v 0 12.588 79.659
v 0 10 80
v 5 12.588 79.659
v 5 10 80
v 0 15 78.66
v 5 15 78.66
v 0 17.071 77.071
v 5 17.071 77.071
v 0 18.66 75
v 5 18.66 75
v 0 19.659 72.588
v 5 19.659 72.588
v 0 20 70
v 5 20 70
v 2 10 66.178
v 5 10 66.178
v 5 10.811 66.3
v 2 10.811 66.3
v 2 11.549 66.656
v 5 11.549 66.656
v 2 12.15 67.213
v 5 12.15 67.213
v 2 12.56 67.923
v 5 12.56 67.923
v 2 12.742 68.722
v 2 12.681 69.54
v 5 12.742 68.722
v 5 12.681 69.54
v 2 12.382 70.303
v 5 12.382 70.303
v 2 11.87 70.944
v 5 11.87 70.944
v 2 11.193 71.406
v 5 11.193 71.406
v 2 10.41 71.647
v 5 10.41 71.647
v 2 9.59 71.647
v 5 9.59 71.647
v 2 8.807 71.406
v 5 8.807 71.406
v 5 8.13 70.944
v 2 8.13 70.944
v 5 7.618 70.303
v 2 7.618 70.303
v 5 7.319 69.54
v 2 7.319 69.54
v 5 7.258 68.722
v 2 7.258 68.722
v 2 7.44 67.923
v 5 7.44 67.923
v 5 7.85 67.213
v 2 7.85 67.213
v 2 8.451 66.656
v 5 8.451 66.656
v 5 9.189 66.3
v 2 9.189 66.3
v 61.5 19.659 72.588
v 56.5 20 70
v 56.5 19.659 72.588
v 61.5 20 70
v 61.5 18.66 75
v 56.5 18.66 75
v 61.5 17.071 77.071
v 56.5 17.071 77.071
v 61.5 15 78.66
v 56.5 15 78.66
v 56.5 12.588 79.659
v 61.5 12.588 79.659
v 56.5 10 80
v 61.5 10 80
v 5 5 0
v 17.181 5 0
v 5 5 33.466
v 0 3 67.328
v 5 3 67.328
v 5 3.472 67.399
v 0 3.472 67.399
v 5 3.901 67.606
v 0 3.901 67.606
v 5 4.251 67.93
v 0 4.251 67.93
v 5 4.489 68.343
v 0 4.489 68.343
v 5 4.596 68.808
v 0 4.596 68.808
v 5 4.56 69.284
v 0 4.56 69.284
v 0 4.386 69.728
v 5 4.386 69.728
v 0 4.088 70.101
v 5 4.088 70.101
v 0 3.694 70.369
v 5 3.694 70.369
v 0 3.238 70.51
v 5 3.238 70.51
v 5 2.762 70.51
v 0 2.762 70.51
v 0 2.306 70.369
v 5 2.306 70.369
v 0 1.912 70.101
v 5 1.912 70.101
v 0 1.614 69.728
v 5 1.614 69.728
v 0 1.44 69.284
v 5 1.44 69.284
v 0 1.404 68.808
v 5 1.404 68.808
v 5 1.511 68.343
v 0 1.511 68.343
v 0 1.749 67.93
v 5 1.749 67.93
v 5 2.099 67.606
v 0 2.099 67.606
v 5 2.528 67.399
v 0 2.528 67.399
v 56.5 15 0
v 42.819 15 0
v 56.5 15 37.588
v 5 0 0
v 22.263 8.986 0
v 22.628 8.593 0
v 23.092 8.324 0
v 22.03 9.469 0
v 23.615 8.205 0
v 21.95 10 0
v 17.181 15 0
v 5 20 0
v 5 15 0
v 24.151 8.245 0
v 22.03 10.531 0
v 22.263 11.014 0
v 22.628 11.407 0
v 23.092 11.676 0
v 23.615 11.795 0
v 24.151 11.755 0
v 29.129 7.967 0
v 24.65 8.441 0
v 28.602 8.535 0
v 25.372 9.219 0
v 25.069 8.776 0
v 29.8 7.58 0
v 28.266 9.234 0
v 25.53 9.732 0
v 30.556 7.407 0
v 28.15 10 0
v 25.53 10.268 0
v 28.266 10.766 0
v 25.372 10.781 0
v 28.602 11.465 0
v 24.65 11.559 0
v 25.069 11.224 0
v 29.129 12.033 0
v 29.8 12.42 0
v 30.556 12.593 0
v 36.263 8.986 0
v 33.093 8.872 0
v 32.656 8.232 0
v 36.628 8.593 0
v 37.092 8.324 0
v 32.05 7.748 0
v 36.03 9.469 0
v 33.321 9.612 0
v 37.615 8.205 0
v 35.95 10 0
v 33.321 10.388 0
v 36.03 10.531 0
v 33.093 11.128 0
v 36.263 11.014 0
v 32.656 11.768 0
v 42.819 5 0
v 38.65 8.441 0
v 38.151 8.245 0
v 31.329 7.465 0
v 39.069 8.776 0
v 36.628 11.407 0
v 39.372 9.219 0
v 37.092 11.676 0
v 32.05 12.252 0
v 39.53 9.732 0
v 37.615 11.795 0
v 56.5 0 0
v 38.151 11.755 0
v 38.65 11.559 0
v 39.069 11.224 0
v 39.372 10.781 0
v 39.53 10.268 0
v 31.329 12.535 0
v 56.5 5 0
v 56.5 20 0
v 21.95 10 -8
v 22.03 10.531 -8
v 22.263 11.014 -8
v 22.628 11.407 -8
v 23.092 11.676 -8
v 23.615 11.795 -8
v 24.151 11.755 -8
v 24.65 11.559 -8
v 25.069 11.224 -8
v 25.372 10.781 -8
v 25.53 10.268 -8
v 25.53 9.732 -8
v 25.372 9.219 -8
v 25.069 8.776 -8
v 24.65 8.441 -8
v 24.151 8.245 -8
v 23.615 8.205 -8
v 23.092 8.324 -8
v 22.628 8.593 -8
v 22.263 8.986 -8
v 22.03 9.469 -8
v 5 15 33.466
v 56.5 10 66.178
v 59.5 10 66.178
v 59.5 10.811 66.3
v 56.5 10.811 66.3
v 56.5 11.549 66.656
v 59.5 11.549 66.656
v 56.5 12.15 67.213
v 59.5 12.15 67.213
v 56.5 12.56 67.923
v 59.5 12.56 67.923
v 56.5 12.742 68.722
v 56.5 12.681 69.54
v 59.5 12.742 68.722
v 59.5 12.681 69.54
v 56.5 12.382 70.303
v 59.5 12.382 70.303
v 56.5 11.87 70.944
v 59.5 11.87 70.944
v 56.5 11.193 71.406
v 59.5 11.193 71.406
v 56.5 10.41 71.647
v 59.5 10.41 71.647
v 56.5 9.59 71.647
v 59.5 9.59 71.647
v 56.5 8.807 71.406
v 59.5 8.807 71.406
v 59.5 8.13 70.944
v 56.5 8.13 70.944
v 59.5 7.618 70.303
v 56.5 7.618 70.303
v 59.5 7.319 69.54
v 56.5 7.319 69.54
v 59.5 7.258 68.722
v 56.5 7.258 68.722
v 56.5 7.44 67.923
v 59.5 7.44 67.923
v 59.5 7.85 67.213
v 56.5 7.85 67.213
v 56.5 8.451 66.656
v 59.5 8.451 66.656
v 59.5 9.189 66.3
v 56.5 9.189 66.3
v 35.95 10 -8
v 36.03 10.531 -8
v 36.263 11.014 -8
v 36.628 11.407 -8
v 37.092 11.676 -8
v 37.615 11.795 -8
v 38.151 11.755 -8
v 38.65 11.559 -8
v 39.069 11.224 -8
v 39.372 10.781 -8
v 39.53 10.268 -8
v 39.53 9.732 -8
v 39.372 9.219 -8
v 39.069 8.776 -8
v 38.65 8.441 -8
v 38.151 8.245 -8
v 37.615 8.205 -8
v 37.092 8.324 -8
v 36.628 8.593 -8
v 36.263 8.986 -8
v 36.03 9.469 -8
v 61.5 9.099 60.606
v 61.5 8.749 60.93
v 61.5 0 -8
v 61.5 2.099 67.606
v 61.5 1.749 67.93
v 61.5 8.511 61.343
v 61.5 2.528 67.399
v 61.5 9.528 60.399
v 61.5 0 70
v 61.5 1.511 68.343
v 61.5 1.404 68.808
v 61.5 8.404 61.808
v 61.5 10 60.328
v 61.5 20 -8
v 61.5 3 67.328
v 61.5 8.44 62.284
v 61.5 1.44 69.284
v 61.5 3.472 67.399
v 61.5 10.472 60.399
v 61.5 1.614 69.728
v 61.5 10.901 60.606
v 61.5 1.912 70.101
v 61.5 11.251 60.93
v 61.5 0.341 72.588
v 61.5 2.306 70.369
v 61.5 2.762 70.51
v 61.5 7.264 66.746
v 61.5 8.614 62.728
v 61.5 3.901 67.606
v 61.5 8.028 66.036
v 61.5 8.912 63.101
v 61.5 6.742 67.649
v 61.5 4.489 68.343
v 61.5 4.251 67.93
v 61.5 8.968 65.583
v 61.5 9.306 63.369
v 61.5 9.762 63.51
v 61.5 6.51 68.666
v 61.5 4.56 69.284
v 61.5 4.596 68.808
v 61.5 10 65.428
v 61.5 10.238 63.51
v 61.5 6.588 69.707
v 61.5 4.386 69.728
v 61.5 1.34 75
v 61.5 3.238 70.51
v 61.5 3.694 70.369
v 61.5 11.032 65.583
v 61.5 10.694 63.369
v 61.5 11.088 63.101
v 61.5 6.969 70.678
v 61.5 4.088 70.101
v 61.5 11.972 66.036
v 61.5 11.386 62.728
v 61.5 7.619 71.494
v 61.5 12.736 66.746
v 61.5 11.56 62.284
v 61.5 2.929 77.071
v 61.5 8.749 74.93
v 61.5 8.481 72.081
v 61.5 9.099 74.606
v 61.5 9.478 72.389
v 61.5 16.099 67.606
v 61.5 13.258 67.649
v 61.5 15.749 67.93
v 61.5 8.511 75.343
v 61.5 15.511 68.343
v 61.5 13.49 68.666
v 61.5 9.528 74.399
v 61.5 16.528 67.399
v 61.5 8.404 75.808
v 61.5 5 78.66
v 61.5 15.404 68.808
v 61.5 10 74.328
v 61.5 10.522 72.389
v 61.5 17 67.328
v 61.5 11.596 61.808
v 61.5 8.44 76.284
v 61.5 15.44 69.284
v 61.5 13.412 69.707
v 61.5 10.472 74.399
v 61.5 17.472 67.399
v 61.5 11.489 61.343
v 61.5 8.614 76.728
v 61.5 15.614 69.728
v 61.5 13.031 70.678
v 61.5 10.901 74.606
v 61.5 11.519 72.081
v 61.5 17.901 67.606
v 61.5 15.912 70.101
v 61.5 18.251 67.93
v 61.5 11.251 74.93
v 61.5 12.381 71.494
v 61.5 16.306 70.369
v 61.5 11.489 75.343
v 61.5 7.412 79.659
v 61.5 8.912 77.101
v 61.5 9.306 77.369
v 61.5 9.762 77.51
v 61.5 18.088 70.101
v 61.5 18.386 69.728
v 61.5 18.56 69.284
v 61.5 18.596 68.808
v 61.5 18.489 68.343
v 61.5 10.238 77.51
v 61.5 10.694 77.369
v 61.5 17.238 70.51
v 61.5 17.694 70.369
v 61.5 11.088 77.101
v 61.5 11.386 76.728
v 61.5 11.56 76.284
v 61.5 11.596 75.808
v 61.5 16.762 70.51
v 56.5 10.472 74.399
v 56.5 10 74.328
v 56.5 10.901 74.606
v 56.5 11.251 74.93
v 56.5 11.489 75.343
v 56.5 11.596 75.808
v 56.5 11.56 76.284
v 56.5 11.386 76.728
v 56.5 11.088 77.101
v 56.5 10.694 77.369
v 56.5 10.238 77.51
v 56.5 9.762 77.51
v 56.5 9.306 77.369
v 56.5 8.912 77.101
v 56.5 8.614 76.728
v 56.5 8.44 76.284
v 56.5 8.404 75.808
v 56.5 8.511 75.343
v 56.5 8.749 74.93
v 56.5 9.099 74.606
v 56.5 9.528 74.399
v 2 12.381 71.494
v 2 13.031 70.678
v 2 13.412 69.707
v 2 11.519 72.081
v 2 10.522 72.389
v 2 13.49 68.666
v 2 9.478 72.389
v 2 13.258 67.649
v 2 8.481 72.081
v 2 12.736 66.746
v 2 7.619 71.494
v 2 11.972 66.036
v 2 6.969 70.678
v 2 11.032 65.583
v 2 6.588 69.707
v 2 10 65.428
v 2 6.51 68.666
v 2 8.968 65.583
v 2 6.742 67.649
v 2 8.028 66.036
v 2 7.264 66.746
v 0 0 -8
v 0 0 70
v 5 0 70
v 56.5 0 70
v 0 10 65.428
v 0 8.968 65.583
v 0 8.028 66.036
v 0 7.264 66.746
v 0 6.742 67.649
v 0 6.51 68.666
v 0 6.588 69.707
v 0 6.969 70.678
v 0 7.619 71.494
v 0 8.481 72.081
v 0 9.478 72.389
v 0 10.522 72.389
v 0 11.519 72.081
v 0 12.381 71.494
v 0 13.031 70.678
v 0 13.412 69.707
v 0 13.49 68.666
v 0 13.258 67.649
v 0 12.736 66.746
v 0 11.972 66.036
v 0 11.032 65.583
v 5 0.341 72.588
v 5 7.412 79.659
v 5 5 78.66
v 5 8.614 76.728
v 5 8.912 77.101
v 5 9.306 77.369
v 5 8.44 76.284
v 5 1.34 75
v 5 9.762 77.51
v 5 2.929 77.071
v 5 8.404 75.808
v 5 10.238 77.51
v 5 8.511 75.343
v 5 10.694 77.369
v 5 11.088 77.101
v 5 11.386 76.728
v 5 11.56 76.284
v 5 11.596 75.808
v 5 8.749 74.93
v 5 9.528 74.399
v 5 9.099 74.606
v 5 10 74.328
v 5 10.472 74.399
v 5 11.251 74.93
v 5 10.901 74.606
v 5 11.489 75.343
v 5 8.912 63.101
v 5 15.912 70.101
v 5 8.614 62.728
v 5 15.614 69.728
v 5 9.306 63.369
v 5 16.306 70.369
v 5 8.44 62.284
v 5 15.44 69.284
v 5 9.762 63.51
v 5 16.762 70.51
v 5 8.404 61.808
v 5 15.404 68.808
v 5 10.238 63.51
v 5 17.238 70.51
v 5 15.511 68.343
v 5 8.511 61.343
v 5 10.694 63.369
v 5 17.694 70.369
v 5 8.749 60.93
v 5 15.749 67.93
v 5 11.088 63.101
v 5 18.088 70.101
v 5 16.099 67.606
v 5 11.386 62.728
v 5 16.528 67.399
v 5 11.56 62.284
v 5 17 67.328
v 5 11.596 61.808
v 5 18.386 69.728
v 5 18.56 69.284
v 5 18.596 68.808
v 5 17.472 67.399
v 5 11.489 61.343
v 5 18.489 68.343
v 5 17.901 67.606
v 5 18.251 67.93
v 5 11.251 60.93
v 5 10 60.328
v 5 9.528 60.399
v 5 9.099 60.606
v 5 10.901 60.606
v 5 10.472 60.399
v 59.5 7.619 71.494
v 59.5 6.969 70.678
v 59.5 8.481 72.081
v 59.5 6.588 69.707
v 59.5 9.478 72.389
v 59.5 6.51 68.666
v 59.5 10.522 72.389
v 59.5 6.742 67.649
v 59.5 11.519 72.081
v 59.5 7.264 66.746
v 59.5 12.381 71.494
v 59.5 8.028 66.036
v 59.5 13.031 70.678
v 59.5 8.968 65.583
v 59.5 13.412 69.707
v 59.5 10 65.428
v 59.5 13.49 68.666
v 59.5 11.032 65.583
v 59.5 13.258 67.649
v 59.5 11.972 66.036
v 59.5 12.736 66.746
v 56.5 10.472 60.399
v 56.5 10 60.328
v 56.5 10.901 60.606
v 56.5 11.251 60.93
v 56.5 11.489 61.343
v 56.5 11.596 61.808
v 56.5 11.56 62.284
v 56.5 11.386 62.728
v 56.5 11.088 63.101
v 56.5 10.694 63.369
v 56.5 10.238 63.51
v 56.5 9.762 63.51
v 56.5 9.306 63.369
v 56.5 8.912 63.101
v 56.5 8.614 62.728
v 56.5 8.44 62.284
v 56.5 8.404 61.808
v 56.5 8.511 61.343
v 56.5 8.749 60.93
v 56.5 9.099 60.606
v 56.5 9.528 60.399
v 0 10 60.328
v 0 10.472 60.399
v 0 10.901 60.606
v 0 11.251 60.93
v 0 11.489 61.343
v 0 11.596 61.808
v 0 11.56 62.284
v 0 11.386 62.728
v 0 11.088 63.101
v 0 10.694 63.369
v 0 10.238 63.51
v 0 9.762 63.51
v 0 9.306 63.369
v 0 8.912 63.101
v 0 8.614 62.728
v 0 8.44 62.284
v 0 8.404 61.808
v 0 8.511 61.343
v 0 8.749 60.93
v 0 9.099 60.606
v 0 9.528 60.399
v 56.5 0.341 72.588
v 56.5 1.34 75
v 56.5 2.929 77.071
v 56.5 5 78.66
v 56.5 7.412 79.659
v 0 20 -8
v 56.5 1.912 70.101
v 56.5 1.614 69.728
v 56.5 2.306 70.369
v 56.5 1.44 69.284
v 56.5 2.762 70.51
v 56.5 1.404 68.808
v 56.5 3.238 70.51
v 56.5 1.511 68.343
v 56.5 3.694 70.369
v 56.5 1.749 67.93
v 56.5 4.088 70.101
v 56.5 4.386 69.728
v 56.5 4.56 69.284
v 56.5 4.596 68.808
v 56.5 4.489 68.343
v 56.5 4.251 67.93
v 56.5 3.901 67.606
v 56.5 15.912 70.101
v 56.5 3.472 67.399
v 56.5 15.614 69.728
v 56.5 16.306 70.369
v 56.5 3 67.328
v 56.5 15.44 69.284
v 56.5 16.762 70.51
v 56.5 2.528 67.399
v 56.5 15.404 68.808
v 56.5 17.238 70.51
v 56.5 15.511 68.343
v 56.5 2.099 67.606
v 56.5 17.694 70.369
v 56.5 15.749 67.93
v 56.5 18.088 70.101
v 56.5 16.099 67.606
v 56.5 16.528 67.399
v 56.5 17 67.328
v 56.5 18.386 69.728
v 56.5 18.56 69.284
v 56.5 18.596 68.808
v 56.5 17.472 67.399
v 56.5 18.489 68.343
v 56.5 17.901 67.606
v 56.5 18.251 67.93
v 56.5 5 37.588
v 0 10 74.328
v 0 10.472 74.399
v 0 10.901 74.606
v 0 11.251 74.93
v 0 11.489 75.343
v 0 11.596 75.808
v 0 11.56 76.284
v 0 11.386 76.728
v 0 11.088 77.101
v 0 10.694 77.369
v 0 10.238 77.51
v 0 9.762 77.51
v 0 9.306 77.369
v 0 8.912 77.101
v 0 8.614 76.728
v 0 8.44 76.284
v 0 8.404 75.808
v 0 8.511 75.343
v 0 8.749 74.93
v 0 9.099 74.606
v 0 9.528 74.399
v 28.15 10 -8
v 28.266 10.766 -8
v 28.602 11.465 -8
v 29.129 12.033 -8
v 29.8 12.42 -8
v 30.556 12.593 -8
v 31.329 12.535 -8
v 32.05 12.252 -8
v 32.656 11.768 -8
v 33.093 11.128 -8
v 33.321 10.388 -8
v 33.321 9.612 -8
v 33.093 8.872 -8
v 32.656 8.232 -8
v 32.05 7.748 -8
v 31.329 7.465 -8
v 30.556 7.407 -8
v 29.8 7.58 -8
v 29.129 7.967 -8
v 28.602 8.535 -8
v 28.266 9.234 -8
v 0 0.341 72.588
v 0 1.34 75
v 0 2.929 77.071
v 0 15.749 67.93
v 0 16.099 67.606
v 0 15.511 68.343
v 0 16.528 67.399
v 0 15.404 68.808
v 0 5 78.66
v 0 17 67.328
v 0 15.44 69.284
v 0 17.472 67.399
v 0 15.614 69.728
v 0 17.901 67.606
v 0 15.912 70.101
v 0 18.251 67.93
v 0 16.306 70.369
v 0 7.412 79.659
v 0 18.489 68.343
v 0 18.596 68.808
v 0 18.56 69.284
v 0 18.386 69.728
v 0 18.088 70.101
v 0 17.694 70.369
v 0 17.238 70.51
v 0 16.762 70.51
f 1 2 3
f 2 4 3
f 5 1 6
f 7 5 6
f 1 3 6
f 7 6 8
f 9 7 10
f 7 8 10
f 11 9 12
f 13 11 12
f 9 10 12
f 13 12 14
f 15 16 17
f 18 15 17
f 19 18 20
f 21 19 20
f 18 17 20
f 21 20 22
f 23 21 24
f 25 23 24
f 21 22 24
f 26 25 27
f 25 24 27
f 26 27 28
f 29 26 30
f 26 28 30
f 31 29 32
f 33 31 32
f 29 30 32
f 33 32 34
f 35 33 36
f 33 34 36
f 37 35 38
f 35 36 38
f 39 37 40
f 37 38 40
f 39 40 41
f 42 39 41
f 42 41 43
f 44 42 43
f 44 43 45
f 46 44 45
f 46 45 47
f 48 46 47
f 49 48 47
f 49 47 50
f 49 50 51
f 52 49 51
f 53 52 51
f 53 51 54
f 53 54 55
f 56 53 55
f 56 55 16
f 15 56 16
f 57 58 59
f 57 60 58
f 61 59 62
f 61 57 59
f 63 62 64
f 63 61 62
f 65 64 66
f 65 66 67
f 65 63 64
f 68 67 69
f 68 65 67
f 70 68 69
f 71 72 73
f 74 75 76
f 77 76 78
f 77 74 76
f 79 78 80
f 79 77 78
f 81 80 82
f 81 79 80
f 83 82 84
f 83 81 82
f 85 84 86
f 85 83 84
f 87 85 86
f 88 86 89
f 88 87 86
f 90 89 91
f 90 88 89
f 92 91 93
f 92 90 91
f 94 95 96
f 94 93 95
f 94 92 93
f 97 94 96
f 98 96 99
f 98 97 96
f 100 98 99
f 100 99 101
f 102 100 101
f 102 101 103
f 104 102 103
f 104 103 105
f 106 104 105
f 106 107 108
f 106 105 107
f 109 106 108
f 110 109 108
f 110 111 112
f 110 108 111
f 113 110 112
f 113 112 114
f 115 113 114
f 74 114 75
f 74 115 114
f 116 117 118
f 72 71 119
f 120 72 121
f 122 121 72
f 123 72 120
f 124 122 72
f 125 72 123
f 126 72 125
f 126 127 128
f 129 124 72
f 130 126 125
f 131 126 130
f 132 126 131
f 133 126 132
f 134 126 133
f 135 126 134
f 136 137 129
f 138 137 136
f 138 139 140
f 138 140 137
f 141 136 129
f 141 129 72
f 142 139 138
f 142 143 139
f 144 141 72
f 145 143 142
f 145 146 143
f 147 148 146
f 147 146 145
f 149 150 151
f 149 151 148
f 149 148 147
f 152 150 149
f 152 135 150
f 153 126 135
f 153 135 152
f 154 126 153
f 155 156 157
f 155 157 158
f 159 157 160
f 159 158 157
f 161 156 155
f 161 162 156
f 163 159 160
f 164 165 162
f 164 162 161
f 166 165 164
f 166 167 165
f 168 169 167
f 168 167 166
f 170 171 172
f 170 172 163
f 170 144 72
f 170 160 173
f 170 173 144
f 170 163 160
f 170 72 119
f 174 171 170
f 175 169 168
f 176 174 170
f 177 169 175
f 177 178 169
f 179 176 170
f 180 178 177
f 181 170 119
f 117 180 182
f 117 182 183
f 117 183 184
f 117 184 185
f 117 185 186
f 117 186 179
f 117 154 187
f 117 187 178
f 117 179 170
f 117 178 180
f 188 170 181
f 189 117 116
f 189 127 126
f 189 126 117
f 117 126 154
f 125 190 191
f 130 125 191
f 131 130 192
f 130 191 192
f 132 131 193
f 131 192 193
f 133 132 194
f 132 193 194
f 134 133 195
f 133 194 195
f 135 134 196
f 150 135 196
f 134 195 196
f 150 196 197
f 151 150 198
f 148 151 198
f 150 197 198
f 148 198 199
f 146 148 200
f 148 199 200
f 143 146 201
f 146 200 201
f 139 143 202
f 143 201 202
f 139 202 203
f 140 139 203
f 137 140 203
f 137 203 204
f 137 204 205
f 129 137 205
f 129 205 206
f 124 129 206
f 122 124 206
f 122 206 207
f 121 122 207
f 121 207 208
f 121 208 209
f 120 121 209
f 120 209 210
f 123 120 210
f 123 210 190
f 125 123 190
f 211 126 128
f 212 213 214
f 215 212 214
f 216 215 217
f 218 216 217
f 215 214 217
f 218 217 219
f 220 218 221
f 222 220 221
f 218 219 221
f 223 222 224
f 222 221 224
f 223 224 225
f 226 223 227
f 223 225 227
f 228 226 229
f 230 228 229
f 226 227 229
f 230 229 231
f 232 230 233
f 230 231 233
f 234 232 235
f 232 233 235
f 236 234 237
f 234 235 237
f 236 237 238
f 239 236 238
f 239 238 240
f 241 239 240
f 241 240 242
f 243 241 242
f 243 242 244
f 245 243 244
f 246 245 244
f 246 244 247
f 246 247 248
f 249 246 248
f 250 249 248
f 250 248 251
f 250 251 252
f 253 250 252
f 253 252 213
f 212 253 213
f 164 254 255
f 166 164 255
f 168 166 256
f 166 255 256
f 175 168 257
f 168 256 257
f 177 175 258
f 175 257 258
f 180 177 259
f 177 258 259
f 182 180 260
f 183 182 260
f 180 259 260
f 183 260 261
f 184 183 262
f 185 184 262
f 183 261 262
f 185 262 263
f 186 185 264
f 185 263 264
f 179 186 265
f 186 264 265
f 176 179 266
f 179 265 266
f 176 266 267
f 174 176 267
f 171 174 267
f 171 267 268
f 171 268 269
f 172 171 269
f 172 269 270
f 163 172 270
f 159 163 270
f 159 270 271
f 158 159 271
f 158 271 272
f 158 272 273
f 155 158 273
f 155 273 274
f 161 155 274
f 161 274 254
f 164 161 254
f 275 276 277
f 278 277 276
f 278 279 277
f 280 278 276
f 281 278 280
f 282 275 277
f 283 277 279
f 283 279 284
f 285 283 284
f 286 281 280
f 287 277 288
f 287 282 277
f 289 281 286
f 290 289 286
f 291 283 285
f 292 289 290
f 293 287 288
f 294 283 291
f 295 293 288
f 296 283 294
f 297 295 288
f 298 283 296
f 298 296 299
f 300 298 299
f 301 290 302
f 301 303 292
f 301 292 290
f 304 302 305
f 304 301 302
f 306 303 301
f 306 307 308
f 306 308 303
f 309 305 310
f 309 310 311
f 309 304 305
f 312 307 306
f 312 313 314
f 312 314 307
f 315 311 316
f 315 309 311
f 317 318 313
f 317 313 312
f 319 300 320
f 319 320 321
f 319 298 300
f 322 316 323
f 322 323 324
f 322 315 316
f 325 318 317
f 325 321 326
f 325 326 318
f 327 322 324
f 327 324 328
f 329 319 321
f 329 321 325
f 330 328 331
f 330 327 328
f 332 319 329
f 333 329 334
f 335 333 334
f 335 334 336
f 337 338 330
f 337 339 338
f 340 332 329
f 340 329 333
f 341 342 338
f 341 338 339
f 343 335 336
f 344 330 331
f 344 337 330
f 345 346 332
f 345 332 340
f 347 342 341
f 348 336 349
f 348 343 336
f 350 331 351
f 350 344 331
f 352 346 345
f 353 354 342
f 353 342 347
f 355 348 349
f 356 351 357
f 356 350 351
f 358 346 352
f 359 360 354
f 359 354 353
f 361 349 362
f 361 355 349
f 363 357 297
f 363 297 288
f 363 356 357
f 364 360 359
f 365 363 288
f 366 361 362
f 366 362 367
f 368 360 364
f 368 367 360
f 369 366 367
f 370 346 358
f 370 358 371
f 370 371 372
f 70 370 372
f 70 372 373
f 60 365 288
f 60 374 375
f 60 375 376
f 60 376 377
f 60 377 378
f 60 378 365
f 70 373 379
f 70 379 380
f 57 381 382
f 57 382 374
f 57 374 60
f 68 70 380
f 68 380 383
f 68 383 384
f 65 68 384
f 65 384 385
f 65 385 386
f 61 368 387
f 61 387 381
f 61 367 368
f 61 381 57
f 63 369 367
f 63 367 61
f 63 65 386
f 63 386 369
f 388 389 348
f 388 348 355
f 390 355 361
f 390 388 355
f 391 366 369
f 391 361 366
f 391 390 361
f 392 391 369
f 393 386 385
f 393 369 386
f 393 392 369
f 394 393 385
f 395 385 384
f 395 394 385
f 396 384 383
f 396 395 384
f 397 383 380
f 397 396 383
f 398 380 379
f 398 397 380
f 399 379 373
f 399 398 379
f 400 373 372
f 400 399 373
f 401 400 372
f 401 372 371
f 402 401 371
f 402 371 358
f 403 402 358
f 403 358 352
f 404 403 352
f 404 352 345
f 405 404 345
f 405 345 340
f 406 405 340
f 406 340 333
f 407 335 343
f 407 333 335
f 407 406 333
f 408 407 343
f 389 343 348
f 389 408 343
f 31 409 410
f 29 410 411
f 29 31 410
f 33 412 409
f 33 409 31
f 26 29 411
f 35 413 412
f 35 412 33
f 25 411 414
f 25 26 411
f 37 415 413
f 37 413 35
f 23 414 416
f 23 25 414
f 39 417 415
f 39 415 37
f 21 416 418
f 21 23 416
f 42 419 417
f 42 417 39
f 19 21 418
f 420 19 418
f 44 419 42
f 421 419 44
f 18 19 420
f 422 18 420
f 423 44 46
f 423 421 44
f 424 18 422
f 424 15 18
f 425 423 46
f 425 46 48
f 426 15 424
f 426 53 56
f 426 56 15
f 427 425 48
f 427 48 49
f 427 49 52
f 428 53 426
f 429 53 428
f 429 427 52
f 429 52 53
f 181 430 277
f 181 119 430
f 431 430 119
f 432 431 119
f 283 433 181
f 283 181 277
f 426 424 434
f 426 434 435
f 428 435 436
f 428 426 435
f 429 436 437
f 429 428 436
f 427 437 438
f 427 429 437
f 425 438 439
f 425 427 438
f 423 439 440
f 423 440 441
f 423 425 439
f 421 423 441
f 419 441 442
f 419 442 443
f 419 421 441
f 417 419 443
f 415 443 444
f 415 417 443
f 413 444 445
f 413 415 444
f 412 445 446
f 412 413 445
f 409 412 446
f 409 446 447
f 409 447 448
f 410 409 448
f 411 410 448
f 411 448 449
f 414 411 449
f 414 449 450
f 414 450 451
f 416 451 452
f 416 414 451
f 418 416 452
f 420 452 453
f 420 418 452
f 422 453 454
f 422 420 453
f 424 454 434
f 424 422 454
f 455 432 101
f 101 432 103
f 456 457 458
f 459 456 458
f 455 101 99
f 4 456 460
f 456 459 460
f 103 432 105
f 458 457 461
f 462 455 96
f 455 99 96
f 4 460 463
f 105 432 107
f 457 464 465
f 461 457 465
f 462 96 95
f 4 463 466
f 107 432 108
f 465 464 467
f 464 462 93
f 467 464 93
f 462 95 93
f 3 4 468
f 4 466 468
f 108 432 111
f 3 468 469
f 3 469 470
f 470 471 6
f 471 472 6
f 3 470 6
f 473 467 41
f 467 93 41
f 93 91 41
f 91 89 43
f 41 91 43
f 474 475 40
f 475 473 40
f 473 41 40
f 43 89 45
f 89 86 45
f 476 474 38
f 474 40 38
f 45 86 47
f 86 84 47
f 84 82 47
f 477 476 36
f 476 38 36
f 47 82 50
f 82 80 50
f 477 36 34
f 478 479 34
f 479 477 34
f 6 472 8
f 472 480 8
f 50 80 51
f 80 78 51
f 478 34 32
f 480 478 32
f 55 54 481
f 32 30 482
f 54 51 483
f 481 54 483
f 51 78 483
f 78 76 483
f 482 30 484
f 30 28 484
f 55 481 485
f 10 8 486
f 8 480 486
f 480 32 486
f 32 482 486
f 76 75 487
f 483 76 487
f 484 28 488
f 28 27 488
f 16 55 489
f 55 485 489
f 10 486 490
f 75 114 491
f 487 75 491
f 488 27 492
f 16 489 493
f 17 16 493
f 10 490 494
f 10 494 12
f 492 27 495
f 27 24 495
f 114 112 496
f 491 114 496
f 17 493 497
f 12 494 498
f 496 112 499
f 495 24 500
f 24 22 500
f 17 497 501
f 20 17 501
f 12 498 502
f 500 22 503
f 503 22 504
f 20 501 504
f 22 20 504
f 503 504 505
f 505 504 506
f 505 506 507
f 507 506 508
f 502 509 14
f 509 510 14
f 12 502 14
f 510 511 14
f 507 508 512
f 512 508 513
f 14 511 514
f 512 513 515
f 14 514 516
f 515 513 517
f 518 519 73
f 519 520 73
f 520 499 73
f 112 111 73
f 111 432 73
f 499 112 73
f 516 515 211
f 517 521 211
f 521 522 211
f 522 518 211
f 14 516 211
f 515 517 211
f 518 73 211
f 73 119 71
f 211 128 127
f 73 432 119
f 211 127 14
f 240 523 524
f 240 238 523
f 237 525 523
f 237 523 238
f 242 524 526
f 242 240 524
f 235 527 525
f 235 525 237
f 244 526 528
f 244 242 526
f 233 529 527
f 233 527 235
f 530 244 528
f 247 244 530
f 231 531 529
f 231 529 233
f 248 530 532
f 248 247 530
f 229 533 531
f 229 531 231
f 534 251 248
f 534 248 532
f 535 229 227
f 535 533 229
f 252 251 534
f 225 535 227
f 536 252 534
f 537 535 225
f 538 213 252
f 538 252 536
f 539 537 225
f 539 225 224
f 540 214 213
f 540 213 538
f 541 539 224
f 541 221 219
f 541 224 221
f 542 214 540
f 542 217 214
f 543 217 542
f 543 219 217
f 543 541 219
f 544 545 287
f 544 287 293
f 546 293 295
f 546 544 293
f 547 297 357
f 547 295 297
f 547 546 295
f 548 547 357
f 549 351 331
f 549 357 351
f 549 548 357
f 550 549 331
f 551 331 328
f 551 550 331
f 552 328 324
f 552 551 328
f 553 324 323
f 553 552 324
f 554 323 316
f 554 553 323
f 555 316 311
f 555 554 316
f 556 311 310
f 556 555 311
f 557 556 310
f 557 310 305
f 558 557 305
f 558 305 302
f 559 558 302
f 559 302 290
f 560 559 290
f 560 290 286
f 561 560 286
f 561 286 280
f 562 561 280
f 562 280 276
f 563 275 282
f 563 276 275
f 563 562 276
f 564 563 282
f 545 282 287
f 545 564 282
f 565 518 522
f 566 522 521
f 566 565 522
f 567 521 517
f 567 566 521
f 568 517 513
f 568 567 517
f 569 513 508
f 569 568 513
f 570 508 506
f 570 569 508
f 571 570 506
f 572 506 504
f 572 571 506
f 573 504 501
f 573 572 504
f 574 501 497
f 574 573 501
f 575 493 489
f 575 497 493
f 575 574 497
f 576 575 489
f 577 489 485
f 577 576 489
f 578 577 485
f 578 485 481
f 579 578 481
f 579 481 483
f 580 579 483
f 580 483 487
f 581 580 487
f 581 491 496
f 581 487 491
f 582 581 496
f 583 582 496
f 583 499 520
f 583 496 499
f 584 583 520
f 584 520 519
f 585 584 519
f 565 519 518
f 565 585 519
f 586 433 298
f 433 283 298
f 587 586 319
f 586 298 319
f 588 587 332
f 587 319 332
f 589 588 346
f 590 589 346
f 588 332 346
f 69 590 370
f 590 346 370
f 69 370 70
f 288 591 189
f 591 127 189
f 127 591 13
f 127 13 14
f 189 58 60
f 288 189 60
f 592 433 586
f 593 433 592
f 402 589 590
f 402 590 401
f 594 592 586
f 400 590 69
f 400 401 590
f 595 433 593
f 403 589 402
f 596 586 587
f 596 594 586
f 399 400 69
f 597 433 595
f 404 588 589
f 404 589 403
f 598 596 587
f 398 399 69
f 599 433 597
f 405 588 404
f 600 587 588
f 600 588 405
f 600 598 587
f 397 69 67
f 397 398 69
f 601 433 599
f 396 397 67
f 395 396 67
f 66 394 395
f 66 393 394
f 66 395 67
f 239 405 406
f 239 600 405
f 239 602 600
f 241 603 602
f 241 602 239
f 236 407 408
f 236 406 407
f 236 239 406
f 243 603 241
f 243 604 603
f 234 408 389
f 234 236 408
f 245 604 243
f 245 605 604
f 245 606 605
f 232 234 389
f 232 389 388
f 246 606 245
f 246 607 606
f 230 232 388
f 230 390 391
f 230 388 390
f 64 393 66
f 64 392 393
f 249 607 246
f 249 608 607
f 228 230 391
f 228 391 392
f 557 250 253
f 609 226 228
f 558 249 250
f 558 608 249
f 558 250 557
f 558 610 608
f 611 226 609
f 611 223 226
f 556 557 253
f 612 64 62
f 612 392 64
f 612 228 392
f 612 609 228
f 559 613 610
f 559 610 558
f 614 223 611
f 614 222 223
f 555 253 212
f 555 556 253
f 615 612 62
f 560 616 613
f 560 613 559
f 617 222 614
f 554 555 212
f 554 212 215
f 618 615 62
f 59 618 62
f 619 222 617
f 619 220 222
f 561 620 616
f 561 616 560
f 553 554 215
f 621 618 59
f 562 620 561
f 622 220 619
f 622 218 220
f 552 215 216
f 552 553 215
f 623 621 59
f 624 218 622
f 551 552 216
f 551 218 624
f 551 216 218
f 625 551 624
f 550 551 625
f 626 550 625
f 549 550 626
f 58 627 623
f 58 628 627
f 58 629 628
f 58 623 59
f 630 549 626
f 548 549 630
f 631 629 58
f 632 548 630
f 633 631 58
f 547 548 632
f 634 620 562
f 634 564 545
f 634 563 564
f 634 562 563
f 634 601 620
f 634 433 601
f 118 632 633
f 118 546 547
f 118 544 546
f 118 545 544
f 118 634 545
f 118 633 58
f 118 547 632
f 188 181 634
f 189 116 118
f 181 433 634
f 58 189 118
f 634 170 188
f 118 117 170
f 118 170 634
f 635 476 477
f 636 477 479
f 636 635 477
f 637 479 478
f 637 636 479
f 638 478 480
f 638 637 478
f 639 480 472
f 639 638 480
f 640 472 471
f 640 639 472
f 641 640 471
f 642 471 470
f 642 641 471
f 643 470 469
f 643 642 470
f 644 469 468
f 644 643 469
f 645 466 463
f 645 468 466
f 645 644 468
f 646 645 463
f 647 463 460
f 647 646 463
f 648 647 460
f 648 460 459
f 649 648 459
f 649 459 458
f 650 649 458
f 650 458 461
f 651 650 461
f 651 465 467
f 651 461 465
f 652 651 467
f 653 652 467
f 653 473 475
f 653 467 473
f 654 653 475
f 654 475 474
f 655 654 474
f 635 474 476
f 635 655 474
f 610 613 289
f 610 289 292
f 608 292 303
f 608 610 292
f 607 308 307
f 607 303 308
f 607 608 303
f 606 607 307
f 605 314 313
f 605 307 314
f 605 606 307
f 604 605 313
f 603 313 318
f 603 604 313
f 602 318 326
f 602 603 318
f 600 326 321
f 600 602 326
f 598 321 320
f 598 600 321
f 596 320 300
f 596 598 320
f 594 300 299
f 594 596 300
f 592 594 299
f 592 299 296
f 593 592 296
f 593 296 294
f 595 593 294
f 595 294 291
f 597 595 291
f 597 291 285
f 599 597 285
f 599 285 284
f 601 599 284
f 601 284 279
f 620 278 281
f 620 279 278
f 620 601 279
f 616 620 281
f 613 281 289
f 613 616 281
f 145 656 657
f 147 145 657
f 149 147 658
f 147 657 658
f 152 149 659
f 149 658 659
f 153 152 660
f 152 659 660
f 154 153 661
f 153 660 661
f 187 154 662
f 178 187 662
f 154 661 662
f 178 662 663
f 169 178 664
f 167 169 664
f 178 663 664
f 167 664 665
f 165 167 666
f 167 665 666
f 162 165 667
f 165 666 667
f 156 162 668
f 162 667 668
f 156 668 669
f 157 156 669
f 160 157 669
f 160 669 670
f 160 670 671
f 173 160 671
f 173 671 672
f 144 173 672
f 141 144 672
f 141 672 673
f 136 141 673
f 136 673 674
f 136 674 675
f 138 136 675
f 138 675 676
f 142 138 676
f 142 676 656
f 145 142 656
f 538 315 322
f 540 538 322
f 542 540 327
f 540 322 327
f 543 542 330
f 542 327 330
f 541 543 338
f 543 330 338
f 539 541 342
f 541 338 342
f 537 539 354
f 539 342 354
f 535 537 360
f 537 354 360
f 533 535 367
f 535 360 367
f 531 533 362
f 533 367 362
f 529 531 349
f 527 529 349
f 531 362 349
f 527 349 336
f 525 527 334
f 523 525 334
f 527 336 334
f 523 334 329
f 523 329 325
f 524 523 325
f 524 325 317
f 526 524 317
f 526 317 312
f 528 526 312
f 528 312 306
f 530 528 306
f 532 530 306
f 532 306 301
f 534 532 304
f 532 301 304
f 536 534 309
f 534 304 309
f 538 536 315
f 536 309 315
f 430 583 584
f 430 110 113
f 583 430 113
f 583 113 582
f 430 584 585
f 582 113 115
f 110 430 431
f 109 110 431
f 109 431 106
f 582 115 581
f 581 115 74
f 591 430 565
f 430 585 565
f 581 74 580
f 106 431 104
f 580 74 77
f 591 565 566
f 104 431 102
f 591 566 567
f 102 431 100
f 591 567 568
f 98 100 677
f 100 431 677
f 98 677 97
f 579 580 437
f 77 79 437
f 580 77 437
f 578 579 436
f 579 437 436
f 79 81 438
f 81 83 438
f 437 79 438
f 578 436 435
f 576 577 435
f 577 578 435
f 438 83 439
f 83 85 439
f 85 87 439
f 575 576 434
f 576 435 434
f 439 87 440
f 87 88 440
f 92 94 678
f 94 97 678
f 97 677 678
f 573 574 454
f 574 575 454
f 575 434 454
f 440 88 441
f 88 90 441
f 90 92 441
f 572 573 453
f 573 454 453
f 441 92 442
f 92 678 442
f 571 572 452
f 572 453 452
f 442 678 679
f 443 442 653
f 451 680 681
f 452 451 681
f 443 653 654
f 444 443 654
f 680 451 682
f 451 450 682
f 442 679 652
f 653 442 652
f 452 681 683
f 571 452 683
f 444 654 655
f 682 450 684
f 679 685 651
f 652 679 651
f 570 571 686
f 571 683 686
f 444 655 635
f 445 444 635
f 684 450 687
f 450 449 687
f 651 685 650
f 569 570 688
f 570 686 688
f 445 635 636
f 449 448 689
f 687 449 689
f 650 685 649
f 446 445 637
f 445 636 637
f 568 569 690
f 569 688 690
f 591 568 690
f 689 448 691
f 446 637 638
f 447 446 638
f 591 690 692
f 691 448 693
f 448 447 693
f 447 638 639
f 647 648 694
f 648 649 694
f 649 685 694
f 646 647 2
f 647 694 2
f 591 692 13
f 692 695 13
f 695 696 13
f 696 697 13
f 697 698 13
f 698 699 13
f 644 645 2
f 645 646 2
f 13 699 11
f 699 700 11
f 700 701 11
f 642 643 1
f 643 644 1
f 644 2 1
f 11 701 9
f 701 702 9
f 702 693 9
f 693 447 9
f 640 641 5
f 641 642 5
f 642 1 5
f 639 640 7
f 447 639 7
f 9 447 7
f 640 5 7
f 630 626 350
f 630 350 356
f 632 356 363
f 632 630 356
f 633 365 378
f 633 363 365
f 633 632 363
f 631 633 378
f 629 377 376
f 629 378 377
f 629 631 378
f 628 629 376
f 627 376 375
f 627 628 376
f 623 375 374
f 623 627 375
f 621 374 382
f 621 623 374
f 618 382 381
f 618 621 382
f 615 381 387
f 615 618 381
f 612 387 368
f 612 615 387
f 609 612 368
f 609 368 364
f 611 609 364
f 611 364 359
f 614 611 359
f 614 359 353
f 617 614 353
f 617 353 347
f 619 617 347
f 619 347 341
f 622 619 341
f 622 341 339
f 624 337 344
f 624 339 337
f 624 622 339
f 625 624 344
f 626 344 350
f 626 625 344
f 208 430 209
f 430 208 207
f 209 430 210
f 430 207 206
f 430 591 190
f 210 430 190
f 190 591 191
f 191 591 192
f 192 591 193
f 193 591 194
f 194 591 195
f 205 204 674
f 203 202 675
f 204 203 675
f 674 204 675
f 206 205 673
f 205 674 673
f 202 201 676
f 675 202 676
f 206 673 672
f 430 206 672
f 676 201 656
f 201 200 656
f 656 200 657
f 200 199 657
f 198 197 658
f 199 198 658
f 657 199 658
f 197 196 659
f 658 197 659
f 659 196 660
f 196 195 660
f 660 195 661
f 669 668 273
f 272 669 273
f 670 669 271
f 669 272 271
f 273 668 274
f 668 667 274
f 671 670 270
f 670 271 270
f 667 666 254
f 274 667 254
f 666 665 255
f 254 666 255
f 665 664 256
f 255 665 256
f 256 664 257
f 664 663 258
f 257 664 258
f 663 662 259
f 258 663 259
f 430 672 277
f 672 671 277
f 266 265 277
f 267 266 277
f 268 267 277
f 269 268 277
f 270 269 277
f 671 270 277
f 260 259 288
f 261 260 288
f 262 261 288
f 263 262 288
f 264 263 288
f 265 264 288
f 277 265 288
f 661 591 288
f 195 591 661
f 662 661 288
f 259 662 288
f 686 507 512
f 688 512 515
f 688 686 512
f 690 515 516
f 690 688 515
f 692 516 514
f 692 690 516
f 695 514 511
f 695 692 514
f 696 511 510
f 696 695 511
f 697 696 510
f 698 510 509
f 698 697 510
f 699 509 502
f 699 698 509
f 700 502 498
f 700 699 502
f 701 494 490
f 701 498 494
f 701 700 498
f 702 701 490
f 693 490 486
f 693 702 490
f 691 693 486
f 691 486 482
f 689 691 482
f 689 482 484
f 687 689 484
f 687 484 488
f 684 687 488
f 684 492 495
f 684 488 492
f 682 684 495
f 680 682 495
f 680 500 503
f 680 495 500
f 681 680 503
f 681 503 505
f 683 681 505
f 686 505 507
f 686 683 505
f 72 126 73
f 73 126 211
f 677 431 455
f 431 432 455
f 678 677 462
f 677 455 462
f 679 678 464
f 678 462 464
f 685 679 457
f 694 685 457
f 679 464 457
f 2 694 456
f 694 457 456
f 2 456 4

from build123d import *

# Parameters (mm, degrees)
ESQUISSE1_W                                 = 5
ESQUISSE1_H                                 = 20
BOSS_EXTRU_1_DEPTH                          = 80
BOSS_EXTRU_1_2_DEPTH                        = 80
ESQUISSE1_3_W                               = 61.5
ESQUISSE1_3_H                               = 20
BOSS_EXTRU_2_DEPTH                          = 8
ESQUISSE3_R                                 = 2.75
ENL_V_MAT_EXTRU_2_DEPTH                     = 85
ESQUISSE4_R                                 = 2.6
ESQUISSE4_R_2                               = 1.8
ENL_V_MAT_EXTRU_3_DEPTH                     = 10
CONG_4_R                                    = 10
ESQUISSE6_R                                 = 1.6
TROUS_PALONNIER_GRABCAD_M3_ENTRAXE_14_DEPTH = 103.870063673
NERVURE2_REACH                              = 103.401
ESQUISSE9_WALL_W                            = 40
ESQUISSE9_WALL_H                            = 10
ESQUISSE10_R                                = 3.5
ENL_V_MAT_EXTRU_4_DEPTH                     = 2
ENL_V_START                                 = -2
ESQUISSE11_R                                = 3.5
ENL_V_MAT_EXTRU_5_DEPTH                     = 2


with BuildPart() as part:
    # Esquisse1 → Boss.-Extru.1 (new body)
    with BuildSketch(Plane.XY):
        with Locations((2.5, 10)):
            Rectangle(ESQUISSE1_W, ESQUISSE1_H)
    extrude(amount=BOSS_EXTRU_1_DEPTH)



with BuildPart() as body_2:
    # Esquisse1 → Boss.-Extru.1 2 (new body)
    with BuildSketch(Plane.XY):
        with Locations((59, 10)):
            Rectangle(ESQUISSE1_W, ESQUISSE1_H)
    extrude(amount=BOSS_EXTRU_1_2_DEPTH)


with BuildPart() as part_1:
    add(part.part)

    add(body_2.part)  # Boss.-Extru.2 merges body 2
    # Esquisse1<3> → Boss.-Extru.2 (add)
    with BuildSketch(Plane.XY):
        with Locations((30.75, 10)):
            Rectangle(ESQUISSE1_3_W, ESQUISSE1_3_H)
    extrude(amount=-BOSS_EXTRU_2_DEPTH)

    # Esquisse3 → Enlèv. mat.-Extru.2 (cut)
    with BuildSketch(Plane(origin=(61.5, 0, 0), x_dir=(0, 0, -1), z_dir=(1, 0, 0))):
        with Locations((-68.927874881, 10)):
            Circle(ESQUISSE3_R)
    extrude(amount=-ENL_V_MAT_EXTRU_2_DEPTH, mode=Mode.SUBTRACT)

    # Esquisse4 → Enlèv. mat.-Extru.3 (cut)
    with BuildSketch(Plane(origin=(0, 0, -8), x_dir=(-1, 0, 0), z_dir=(0, 0, -1))):
        with Locations((-30.75, 10)):
            Circle(ESQUISSE4_R)
        with Locations((-37.75, 10)):
            Circle(ESQUISSE4_R_2)
        with Locations((-23.75, 10)):
            Circle(ESQUISSE4_R_2)
    extrude(amount=-ENL_V_MAT_EXTRU_3_DEPTH, mode=Mode.SUBTRACT)

    # Congé4
    cong_4_edges = [part_1.edges().sort_by_distance(p)[0] for p in [
        (2.5, 20, 80),
        (2.5, 0, 80),
        (59, 0, 80),
        (59, 20, 80),
    ]]
    fillet(cong_4_edges, radius=CONG_4_R - 0.0001)  # a hair under: the kernel refuses the full size

    # Esquisse6 → Trous palonnier GrabCAD M3 entraxe 14 (cut, through all)
    with BuildSketch(Plane(origin=(0, 0, 0), x_dir=(0, 0, -1), z_dir=(1, 0, 0))):
        with Locations((-75.927874881, 10)):
            Circle(ESQUISSE6_R)
        with Locations((-68.927874881, 17)):
            Circle(ESQUISSE6_R)
        with Locations((-61.927874881, 10)):
            Circle(ESQUISSE6_R)
        with Locations((-68.927874881, 3)):
            Circle(ESQUISSE6_R)
    extrude(amount=TROUS_PALONNIER_GRABCAD_M3_ENTRAXE_14_DEPTH, mode=Mode.SUBTRACT)

    # Esquisse9 wall → Nervure2 (add, up to next)
    with BuildSketch(Plane(origin=(49.659597134, 10, 18.793852416), x_dir=(0.342020143329, 0, 0.939692620785), z_dir=(-0.939692620785, 0, 0.342020143329)), mode=Mode.PRIVATE) as nervure2_sk1:
        Rectangle(ESQUISSE9_WALL_W, ESQUISSE9_WALL_H)
    nervure2_tool1 = extrude(nervure2_sk1.sketch, amount=-NERVURE2_REACH, mode=Mode.PRIVATE) - part_1.part
    nervure2 = nervure2_tool1.solids().sort_by_distance((49.659597134, 10, 18.793852416))[0]
    add(nervure2)

    # Symétrie1: Nervure2 across plane
    add(nervure2.mirror(Plane.ZY.offset(-30)))

    # Esquisse10 → Enlèv. mat.-Extru.4 (cut)
    with BuildSketch(Plane(origin=(61.5, 0, 0), x_dir=(0, 0, -1), z_dir=(1, 0, 0))):
        with Locations((-68.927874881, 10)):
            Circle(ESQUISSE10_R)
    extrude(amount=-ENL_V_MAT_EXTRU_4_DEPTH, mode=Mode.SUBTRACT)

    # Esquisse11 → Enlèv. mat.-Extru.5 (cut)
    with BuildSketch(Plane.ZY.offset(ENL_V_START)):
        with Locations(Location((68.927874881, 10, 0), (0, 0, 180))):
            Circle(ESQUISSE11_R)
    extrude(amount=ENL_V_MAT_EXTRU_5_DEPTH, mode=Mode.SUBTRACT)


solid = part_1.part
